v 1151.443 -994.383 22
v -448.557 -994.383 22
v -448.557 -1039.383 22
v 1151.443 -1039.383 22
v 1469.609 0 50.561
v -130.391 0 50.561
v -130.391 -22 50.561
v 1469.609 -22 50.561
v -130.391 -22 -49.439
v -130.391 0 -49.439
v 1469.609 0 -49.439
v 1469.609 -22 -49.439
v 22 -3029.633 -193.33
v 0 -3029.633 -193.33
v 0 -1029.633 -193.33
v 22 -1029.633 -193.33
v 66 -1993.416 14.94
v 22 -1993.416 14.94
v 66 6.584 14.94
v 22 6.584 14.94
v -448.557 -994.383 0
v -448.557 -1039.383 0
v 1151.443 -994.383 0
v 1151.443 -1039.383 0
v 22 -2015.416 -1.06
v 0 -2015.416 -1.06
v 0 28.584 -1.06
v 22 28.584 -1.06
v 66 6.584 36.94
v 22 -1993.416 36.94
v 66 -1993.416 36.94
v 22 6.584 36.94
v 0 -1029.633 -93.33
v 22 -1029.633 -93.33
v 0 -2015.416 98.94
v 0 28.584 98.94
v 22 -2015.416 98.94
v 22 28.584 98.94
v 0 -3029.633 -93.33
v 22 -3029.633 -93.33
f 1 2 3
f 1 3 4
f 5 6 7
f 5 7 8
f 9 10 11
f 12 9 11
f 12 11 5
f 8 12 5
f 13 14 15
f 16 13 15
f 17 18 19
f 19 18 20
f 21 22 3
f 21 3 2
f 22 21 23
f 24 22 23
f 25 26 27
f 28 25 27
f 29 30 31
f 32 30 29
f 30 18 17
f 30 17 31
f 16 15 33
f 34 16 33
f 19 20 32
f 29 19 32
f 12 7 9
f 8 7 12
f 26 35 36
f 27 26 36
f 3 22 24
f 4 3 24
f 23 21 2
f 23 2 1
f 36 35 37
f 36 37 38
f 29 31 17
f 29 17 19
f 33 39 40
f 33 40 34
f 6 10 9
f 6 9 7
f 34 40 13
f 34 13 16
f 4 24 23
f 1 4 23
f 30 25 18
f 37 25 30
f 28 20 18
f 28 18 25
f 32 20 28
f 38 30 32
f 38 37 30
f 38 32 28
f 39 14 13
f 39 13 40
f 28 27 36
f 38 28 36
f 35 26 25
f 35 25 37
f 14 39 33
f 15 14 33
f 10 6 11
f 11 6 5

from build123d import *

# Parameters (mm, degrees)
F1_W     = 2044
F1_H     = 100
F1_W_2   = 2000
F1_H_2   = 22
F3_DEPTH = 22
F4_DEPTH = 66
F2_W     = 1600
F2_H     = 100
F5_DEPTH = 22
F6_W     = 1600
F6_H     = 45
F7_DEPTH = 22
F8_W     = 2000
F8_H     = 100
F9_DEPTH = 22


with BuildPart() as f3:
    # F1 (on Right) → F3 (new body)
    with BuildSketch(Plane.YZ):
        with Locations((-993.4160848077, 48.9403463067)):
            Rectangle(F1_W, F1_H)
        with Locations((-993.4160848077, 25.9403463067)):
            Rectangle(F1_W_2, F1_H_2, mode=Mode.SUBTRACT)
    extrude(amount=F3_DEPTH)

    # F1 (on Right) → F4 (join)
    with BuildSketch(Plane.YZ):
        with Locations((-993.4160848077, 25.9403463067)):
            Rectangle(F1_W_2, F1_H_2)
    extrude(amount=F4_DEPTH)


with BuildPart() as f5:
    # F2 (on Front) → F5 (new body)
    with BuildSketch(Plane.XZ):
        with Locations((669.6090708971, 0.5605035093)):
            Rectangle(F2_W, F2_H)
    extrude(amount=F5_DEPTH)


with BuildPart() as f7:
    # F6 (on Top) → F7 (new body)
    with BuildSketch(Plane.XY):
        with Locations((351.4434993267, -1016.8831119705)):
            Rectangle(F6_W, F6_H)
    extrude(amount=F7_DEPTH)


with BuildPart() as f9:
    # F8 (on Right) → F9 (new body)
    with BuildSketch(Plane.YZ):
        with Locations((-2029.6325683594, -143.3295997611)):
            Rectangle(F8_W, F8_H)
    extrude(amount=F9_DEPTH)


solid = Compound([f3.part, f5.part, f7.part, f9.part])
